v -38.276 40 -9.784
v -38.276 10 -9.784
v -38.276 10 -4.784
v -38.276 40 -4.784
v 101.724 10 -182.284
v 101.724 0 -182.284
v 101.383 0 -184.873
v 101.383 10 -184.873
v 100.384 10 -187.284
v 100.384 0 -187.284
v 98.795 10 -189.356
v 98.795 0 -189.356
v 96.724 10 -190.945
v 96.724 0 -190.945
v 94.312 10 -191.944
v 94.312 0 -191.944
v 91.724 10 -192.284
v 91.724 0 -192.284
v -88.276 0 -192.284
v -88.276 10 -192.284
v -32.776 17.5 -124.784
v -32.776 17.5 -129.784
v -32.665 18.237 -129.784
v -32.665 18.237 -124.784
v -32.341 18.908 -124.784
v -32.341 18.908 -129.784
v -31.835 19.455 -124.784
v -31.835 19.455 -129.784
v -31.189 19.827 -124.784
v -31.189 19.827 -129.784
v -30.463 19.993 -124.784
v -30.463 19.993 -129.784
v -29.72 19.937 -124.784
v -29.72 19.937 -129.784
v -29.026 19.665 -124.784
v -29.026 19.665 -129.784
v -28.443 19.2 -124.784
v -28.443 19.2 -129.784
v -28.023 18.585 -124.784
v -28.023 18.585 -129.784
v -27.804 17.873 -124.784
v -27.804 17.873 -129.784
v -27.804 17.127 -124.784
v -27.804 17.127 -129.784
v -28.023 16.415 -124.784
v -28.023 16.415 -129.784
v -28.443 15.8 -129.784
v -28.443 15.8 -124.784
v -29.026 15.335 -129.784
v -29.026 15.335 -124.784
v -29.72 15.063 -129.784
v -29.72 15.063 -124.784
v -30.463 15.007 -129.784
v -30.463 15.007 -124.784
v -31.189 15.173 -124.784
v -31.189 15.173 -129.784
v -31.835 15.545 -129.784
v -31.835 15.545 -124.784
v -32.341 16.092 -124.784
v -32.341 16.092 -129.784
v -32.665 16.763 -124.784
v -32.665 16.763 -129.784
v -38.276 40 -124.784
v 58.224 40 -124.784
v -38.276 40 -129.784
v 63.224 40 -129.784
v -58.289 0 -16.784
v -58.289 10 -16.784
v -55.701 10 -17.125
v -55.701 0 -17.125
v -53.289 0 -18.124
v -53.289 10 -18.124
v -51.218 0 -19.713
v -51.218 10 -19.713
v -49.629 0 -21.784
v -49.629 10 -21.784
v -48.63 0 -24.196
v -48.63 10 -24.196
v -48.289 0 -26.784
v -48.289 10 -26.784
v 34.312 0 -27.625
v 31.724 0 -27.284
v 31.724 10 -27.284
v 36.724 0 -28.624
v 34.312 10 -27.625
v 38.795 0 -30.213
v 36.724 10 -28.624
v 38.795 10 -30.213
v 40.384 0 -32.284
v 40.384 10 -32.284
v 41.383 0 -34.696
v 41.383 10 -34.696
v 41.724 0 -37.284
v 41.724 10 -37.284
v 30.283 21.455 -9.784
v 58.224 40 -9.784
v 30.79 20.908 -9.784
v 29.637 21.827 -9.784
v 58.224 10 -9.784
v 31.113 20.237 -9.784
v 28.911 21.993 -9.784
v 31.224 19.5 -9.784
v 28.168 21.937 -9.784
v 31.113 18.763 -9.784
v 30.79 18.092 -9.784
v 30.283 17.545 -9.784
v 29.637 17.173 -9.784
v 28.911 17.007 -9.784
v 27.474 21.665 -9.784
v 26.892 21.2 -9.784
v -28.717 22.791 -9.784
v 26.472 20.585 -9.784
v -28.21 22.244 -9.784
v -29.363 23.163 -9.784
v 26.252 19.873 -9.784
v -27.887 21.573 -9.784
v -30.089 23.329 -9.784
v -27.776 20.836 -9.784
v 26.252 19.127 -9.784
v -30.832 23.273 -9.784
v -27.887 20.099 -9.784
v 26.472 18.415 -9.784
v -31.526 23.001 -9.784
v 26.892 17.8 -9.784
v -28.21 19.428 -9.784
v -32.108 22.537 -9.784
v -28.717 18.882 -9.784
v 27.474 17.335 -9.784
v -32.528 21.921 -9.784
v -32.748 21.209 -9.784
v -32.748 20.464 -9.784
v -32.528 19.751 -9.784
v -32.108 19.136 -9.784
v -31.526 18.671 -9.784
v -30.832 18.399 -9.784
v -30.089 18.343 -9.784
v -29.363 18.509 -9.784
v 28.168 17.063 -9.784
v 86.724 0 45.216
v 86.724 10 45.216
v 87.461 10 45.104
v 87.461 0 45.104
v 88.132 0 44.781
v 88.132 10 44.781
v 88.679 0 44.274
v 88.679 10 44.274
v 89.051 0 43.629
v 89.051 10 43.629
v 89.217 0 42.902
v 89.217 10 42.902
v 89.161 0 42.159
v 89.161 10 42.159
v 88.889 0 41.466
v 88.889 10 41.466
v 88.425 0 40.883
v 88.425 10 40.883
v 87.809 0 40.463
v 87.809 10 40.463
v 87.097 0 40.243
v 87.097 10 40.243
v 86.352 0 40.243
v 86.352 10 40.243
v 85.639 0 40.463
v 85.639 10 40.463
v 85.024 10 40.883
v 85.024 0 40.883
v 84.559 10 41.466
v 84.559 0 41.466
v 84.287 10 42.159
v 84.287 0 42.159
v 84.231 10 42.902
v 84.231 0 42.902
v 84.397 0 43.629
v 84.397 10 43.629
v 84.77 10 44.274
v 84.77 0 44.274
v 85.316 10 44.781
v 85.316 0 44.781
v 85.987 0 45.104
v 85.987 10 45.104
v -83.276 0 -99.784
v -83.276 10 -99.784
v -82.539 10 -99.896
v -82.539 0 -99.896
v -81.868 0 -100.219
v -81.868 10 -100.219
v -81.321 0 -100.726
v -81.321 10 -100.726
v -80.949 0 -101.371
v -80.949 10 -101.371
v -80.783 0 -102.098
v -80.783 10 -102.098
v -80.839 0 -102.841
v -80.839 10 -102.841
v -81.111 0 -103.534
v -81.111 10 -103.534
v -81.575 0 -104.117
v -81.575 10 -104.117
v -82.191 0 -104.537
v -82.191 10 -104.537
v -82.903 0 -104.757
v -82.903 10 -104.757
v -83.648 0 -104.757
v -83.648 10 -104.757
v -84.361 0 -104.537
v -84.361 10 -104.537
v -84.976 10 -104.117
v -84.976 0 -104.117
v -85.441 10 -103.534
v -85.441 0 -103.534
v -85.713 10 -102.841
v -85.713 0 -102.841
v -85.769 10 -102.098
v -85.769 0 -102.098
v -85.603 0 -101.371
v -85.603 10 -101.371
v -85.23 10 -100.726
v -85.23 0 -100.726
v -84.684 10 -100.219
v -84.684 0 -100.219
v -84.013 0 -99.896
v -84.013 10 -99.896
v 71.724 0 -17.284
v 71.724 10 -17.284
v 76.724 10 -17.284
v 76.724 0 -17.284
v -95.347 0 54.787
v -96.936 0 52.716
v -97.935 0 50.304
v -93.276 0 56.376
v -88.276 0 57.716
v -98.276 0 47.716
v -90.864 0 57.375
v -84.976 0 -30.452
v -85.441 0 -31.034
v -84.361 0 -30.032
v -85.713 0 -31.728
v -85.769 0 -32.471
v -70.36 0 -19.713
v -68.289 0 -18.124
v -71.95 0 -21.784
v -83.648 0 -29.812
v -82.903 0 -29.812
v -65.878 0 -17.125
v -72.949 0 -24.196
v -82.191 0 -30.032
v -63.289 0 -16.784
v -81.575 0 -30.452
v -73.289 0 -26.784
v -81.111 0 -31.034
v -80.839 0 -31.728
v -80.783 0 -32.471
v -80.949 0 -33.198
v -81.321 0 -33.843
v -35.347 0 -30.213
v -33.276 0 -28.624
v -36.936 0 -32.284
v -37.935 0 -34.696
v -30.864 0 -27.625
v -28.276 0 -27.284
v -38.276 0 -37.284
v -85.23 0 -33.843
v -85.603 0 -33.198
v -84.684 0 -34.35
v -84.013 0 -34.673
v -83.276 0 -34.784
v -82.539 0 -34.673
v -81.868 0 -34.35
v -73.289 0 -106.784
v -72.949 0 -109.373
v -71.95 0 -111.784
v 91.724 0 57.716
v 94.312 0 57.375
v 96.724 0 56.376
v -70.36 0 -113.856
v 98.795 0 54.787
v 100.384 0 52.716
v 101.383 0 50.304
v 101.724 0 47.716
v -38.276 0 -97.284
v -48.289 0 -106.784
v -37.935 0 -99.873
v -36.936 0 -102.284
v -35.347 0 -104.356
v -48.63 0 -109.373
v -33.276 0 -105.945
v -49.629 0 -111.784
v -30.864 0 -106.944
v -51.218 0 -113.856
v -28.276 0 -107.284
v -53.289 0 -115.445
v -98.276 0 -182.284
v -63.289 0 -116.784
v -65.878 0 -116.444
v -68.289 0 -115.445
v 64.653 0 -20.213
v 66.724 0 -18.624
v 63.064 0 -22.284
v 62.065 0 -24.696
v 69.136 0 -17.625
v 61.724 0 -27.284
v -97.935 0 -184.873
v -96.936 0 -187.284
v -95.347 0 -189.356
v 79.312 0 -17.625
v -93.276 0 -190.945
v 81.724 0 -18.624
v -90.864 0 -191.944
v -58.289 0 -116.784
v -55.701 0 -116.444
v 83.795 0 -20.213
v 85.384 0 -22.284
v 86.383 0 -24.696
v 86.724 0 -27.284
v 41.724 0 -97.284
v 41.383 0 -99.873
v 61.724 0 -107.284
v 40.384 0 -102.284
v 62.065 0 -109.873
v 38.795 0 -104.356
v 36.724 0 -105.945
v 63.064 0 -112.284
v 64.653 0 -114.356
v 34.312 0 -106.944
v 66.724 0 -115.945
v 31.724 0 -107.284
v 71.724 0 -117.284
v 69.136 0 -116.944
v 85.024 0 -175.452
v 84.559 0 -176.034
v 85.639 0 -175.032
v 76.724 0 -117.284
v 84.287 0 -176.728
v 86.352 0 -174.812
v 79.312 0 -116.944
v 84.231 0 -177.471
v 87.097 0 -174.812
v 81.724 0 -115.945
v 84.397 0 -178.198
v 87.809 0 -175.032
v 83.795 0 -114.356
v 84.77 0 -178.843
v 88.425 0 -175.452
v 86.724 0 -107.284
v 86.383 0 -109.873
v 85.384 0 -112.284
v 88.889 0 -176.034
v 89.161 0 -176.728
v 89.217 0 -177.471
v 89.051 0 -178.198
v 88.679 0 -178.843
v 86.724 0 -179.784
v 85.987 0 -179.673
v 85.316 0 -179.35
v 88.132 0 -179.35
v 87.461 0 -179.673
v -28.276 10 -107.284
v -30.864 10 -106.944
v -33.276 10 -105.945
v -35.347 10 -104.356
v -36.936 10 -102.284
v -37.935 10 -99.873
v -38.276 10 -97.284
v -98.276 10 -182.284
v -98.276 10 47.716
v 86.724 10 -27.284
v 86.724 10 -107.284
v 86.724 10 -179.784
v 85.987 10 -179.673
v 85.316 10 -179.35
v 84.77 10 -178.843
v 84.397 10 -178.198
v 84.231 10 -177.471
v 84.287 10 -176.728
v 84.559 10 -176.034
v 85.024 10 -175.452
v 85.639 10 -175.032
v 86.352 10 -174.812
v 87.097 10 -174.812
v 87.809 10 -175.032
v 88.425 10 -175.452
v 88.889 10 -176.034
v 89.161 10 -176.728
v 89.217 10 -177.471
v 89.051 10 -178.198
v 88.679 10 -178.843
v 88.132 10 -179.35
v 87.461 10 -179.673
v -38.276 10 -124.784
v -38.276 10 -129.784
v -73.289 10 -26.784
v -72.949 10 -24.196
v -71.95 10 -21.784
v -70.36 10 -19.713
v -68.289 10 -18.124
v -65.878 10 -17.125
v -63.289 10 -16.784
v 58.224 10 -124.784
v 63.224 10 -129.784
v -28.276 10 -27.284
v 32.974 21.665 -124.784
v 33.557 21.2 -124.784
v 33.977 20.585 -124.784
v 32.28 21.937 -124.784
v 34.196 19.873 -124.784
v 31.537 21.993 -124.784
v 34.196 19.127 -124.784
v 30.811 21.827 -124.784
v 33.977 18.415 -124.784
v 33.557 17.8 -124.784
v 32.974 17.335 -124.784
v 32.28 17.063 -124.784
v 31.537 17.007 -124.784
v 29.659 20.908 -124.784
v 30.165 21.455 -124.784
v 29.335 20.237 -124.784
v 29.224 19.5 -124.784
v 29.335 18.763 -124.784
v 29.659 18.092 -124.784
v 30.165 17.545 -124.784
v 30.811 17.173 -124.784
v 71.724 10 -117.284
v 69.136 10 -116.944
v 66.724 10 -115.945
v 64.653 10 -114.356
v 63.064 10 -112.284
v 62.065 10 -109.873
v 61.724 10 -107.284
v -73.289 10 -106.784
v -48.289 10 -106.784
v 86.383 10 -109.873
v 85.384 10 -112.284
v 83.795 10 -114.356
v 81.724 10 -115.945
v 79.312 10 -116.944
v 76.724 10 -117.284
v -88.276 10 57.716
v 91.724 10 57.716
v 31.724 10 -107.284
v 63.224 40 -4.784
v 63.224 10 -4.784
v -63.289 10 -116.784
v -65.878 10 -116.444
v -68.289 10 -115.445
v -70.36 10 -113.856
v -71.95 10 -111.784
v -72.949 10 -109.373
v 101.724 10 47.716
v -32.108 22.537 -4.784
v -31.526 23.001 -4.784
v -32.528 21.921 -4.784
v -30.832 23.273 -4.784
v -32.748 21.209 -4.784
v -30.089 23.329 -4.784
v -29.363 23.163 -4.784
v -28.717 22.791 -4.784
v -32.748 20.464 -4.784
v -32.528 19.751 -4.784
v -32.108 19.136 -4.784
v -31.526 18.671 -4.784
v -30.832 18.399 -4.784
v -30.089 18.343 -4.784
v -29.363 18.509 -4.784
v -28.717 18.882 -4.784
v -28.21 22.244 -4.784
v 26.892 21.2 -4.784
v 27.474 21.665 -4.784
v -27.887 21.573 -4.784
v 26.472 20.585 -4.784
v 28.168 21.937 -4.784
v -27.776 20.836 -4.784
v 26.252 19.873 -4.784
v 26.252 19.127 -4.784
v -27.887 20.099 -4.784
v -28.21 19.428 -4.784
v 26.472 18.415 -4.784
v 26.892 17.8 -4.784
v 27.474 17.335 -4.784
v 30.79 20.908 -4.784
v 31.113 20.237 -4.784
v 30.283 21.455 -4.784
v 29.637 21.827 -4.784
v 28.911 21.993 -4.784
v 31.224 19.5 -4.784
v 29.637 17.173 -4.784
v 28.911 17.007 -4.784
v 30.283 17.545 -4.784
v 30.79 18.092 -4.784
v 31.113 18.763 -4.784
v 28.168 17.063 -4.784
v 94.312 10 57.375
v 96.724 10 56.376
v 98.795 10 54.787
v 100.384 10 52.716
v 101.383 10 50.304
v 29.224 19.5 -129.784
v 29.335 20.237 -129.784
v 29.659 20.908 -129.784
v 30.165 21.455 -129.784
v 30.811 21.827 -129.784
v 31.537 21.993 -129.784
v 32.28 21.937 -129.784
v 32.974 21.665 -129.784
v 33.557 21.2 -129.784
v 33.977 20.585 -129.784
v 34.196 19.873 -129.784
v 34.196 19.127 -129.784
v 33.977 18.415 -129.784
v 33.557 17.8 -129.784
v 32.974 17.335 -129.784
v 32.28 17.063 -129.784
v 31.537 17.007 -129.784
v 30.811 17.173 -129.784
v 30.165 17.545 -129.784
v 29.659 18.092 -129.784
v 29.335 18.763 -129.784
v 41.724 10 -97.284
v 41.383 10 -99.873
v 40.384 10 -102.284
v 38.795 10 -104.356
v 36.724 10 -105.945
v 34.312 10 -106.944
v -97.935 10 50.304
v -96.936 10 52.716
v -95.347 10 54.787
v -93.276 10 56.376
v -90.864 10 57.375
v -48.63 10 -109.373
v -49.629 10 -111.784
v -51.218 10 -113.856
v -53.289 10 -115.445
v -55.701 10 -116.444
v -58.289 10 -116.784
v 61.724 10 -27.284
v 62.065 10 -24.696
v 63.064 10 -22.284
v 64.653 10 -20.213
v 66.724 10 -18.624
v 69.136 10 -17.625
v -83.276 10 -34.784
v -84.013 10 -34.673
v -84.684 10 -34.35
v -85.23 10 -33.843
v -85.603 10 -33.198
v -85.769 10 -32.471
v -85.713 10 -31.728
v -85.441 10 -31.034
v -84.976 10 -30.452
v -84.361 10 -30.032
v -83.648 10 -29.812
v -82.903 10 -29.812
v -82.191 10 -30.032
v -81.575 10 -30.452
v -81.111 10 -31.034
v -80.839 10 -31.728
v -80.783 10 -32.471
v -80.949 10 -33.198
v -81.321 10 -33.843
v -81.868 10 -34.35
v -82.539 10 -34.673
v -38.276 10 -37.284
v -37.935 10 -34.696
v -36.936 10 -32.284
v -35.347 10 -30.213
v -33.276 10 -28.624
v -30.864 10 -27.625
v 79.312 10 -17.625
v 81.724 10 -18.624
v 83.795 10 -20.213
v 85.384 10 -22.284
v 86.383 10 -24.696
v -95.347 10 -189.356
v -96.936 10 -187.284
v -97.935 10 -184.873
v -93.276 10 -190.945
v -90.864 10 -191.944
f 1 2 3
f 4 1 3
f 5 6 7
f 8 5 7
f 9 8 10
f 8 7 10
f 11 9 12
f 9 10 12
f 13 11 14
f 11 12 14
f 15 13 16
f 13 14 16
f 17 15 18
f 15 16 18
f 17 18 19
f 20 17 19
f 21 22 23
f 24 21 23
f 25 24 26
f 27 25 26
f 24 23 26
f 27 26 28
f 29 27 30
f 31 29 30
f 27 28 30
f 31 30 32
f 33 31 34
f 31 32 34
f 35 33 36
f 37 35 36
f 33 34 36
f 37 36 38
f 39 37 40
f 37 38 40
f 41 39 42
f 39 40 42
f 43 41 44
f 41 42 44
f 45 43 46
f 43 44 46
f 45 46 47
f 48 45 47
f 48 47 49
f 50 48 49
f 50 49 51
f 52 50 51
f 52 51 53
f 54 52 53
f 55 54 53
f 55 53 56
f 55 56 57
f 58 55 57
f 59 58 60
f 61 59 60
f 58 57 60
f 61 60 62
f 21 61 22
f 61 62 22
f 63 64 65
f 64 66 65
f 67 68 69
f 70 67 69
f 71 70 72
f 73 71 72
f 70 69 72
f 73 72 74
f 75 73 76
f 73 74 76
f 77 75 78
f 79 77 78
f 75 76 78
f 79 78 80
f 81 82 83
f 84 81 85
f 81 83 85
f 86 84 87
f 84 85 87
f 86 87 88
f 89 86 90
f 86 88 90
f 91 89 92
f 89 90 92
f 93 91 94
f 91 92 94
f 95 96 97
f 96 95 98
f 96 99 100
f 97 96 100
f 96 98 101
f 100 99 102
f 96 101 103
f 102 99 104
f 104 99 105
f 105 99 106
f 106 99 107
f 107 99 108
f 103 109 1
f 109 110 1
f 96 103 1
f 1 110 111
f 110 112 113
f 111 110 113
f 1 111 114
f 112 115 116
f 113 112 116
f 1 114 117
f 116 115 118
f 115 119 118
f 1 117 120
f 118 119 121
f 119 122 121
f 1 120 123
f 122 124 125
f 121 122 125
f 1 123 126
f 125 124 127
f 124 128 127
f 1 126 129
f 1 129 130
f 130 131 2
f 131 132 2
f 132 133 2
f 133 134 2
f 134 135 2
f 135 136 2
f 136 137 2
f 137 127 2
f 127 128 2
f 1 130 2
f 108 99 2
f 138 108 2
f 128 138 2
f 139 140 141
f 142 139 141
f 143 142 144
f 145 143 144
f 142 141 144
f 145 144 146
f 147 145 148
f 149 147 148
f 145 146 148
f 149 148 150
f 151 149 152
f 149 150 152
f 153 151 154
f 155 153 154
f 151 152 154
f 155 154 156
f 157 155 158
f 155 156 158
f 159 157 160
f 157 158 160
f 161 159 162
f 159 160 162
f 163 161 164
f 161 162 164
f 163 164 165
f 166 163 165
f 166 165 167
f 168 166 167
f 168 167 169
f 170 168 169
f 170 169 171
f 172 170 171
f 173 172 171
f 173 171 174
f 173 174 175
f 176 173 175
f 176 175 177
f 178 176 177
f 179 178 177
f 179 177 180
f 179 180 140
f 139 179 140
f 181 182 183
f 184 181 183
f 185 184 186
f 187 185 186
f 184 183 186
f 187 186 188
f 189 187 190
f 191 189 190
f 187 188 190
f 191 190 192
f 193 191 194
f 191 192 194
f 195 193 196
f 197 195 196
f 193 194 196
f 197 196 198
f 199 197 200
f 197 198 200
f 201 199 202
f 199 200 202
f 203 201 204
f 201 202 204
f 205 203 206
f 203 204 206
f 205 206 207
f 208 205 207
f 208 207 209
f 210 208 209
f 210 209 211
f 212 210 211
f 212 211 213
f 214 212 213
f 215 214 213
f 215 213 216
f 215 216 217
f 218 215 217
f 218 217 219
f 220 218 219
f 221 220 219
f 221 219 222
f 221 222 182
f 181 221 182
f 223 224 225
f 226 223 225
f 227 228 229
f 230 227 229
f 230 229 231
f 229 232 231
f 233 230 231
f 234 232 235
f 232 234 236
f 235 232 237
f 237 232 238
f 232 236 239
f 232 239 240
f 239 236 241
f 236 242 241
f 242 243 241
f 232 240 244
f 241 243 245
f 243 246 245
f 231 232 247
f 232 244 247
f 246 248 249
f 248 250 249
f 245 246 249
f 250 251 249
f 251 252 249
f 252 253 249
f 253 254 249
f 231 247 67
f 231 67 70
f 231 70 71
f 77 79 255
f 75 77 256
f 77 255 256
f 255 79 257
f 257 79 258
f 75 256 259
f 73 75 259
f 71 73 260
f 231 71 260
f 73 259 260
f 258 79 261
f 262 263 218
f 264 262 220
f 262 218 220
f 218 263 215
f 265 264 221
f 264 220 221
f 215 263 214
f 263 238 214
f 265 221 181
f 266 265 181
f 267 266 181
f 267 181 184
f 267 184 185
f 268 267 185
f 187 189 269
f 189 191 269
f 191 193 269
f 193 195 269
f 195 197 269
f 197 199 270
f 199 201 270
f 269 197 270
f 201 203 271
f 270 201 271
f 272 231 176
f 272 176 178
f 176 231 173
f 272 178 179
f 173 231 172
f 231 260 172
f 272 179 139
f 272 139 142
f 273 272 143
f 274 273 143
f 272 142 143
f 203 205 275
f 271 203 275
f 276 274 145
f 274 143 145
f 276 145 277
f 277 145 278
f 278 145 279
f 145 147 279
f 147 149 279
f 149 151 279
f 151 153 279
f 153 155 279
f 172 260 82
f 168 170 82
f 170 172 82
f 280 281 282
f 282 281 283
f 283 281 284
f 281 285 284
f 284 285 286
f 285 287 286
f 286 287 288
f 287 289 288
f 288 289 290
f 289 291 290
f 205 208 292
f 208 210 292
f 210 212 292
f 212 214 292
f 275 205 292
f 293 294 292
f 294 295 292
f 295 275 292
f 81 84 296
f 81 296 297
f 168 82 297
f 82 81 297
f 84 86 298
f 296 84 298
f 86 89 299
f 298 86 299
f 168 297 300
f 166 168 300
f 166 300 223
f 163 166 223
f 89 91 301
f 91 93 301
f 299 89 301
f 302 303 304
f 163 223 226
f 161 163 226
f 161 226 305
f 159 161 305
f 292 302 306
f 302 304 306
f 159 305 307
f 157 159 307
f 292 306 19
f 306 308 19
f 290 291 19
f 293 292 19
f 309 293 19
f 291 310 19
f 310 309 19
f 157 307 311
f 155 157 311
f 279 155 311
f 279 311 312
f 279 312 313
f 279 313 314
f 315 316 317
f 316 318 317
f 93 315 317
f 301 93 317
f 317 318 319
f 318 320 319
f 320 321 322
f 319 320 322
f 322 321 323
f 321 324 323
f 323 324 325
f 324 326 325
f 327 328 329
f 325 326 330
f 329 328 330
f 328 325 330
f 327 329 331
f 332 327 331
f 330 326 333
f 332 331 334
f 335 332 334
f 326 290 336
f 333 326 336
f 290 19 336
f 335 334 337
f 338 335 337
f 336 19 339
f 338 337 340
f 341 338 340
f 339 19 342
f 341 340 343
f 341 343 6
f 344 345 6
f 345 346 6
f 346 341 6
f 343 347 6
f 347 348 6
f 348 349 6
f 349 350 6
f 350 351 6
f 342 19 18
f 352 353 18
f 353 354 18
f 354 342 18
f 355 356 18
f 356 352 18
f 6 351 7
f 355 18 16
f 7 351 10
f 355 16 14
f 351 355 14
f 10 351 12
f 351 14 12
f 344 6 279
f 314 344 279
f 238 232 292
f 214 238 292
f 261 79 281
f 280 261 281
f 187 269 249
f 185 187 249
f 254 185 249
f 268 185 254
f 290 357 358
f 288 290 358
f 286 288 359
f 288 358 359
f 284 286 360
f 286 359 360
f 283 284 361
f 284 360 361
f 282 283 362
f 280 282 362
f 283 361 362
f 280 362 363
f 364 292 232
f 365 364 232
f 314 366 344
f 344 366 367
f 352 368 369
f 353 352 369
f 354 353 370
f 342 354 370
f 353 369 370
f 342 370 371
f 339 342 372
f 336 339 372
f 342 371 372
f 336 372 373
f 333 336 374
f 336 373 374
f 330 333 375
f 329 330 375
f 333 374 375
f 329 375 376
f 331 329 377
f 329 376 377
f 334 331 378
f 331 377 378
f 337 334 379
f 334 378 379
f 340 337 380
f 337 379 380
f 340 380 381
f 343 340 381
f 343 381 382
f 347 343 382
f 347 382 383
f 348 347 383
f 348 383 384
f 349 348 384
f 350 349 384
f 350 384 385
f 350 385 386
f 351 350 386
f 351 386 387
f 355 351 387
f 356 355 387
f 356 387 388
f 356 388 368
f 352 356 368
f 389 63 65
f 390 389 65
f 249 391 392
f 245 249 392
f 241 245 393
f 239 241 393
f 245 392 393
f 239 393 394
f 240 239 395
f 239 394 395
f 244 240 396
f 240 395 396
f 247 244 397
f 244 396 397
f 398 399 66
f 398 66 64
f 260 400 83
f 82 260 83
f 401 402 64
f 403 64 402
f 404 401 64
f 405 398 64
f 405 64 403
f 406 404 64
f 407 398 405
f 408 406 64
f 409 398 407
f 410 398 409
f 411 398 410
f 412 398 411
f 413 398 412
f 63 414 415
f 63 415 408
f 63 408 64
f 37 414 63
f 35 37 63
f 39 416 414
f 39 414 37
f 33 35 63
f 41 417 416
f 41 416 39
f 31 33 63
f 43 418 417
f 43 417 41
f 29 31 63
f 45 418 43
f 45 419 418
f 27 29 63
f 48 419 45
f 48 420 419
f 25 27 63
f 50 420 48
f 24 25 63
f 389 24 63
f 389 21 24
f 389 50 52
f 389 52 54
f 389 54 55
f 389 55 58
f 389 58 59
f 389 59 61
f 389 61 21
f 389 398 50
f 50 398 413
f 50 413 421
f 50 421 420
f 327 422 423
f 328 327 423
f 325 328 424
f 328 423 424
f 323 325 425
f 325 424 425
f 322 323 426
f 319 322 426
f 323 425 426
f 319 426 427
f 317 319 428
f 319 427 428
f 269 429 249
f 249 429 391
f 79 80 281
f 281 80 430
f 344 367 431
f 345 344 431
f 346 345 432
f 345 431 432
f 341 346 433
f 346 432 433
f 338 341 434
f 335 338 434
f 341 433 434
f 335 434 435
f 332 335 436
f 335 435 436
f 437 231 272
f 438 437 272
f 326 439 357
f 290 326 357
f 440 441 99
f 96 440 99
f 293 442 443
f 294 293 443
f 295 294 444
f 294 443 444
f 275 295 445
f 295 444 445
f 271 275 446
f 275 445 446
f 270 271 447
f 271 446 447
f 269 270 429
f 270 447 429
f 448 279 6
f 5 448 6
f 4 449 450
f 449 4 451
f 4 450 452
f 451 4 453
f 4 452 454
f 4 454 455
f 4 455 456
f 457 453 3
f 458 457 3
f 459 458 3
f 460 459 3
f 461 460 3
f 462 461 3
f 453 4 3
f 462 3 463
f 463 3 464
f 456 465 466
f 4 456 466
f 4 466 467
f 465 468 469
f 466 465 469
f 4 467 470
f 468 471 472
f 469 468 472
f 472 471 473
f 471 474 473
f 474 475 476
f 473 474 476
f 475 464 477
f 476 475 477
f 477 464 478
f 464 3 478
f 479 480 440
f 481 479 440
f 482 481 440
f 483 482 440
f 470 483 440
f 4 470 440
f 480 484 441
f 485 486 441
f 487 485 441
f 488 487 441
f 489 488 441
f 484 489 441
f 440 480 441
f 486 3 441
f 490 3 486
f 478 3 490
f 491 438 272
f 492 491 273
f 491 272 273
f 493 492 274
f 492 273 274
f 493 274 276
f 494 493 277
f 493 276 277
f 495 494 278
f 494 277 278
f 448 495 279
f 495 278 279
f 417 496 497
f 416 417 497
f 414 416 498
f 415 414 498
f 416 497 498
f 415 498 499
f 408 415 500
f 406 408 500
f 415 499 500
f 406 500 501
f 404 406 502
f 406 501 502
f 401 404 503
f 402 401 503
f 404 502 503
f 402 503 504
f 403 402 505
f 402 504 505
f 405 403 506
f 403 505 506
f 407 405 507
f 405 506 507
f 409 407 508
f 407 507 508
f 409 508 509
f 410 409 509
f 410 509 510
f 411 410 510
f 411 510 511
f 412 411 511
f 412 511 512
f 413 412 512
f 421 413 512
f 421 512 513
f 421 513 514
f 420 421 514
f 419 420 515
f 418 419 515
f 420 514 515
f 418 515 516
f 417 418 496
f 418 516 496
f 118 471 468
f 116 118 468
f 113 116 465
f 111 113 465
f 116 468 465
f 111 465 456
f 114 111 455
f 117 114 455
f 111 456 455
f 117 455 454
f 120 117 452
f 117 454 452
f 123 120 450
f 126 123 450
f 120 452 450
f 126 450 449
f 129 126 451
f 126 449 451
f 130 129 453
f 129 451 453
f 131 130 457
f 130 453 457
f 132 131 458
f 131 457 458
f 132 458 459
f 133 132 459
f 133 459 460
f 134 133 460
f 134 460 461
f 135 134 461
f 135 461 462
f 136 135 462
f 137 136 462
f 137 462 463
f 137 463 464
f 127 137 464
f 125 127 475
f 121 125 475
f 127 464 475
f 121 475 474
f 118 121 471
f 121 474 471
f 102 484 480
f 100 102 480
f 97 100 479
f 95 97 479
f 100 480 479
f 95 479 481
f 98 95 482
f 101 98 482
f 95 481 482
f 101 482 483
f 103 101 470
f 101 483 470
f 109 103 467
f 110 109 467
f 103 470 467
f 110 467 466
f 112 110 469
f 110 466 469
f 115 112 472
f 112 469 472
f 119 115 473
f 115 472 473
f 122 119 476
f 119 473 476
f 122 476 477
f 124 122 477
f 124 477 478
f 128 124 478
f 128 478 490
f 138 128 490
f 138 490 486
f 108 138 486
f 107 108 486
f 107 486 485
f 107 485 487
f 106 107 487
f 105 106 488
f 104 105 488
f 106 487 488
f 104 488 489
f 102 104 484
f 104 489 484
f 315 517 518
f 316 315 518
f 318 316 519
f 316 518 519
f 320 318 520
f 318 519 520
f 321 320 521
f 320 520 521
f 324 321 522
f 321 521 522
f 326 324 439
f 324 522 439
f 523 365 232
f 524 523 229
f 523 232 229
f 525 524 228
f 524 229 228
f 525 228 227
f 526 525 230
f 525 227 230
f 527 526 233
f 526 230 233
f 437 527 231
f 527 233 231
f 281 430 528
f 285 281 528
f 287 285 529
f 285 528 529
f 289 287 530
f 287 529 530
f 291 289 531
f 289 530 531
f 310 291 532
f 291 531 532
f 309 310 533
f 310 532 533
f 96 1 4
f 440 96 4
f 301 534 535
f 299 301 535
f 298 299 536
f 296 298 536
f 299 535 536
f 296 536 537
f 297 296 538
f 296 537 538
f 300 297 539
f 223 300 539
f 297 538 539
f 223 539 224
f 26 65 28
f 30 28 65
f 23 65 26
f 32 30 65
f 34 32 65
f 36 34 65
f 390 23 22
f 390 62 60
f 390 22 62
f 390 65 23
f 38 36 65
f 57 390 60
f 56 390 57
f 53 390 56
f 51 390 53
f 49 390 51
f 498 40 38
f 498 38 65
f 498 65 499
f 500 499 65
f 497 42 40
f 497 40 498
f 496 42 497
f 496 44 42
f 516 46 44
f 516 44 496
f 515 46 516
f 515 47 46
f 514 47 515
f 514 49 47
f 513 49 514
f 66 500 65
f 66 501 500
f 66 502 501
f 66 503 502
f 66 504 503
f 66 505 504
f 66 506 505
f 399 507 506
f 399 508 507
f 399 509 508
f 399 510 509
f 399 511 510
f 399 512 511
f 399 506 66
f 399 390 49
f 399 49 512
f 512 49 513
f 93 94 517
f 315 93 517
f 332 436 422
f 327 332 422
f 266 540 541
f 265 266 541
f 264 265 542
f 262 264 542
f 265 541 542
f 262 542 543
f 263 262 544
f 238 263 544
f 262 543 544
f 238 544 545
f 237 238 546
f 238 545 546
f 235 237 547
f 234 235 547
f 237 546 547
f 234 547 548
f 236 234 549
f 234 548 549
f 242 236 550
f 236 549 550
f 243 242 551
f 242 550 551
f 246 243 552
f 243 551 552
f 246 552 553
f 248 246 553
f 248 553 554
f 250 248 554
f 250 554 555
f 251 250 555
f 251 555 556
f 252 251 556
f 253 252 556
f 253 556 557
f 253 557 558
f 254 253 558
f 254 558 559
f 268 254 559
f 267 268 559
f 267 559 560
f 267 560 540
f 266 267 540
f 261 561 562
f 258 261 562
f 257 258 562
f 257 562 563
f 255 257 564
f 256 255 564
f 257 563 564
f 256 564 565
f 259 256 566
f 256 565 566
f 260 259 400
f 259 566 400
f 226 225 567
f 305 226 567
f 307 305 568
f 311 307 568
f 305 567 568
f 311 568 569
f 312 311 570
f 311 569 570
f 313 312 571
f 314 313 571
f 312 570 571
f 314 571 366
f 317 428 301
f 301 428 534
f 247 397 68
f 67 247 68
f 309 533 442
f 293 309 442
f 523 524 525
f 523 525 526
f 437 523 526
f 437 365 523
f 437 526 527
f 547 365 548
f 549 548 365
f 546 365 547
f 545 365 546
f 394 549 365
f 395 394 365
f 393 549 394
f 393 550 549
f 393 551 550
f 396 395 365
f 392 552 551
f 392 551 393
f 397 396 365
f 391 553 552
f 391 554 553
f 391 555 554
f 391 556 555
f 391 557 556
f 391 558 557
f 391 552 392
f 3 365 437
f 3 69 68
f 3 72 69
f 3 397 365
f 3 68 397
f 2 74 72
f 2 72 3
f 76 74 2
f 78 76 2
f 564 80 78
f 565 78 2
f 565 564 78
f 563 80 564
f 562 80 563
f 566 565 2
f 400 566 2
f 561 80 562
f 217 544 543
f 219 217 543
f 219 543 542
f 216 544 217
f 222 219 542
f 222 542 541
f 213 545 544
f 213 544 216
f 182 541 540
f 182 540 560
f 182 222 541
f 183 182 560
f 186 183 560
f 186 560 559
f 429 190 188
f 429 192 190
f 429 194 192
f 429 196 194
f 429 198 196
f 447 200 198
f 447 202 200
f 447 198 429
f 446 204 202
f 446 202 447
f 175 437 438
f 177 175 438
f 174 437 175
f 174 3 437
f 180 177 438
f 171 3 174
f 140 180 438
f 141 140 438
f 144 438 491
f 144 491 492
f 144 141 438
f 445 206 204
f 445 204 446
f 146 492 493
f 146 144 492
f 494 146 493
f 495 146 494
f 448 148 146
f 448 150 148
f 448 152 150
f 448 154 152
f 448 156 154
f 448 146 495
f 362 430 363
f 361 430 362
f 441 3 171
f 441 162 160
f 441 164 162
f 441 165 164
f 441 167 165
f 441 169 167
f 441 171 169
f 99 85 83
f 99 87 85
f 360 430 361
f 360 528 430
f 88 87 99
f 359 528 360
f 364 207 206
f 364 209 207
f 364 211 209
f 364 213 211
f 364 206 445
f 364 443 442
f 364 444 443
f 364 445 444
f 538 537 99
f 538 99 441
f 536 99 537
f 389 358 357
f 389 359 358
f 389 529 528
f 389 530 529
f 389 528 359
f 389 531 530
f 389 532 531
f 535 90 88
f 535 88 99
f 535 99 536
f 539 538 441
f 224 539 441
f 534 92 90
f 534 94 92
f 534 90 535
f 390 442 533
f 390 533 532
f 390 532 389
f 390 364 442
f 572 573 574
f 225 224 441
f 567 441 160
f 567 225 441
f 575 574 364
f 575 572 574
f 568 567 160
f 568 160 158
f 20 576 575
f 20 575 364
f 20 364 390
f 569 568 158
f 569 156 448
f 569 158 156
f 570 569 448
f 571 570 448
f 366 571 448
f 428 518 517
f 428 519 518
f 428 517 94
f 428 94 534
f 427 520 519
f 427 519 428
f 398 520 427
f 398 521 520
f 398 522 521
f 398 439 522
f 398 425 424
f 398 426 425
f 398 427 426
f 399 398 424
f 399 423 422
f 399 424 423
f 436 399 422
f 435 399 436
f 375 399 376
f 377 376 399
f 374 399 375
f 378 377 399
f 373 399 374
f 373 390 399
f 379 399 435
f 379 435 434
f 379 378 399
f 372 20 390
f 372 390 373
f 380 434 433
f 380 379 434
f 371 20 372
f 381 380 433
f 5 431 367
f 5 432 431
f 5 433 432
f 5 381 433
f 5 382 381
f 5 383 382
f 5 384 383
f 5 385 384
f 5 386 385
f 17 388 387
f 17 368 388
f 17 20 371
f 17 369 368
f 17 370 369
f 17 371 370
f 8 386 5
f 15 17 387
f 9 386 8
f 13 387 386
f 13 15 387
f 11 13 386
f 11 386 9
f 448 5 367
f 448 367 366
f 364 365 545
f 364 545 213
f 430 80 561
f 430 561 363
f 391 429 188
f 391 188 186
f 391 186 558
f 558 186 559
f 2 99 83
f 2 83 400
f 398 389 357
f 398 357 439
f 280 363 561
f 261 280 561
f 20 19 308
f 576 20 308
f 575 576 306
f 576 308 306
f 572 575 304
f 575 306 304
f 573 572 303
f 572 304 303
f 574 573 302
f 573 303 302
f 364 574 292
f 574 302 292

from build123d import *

# Parameters (mm, degrees)
RESSALTO_EXTRUS_O1_DEPTH = 10
ESBO_O2_R                = 2.5
CORTE_EXTRUS_O1_DEPTH    = 218.763914705
RESSALTO_EXTRUS_O2_DEPTH = 30
ESBO_O5_R                = 2.5
CORTE_EXTRUS_O2_DEPTH    = 5
ESBO_O6_R                = 2.5
CORTE_EXTRUS_O3_DEPTH    = 5
CORTE_EXTRUS_O4_DEPTH    = 10


with BuildPart() as part:
    # Esboço1 → Ressalto-extrusão1 (new body)
    with BuildSketch(Plane(origin=(0, 0, 0), x_dir=(1, 0, 0), z_dir=(0, 1, 0))):
        with BuildLine():
            Line((-88.275862069, -57.715517241), (91.724137931, -57.715517241))
            ThreePointArc((91.724137931, -57.715517241), (98.795205743, -54.786585053), (101.724137931, -47.715517241))
            Line((101.724137931, -47.715517241), (101.724137931, 182.284482759))
            ThreePointArc((101.724137931, 182.284482759), (98.795205743, 189.35555057), (91.724137931, 192.284482759))
            Line((91.724137931, 192.284482759), (-88.275862069, 192.284482759))
            ThreePointArc((-88.275862069, 192.284482759), (-95.346929881, 189.35555057), (-98.275862069, 182.284482759))
            Line((-98.275862069, 182.284482759), (-98.275862069, -47.715517241))
            ThreePointArc((-98.275862069, -47.715517241), (-95.346929881, -54.786585053), (-88.275862069, -57.715517241))
        make_face()
    extrude(amount=RESSALTO_EXTRUS_O1_DEPTH)

    # Esboço2 → Corte-extrusão1 (cut, through all)
    with BuildSketch(Plane(origin=(0, 10, 0), x_dir=(1, 0, 0), z_dir=(0, 1, 0))):
        with Locations(Location((-83.275862069, 102.284482759, 0), (0, 0, 270))):
            Circle(ESBO_O2_R)
        with Locations(Location((86.724137931, 177.284482759, 0), (0, 0, 90))):
            Circle(ESBO_O2_R)
        with Locations(Location((86.724137931, -42.715517241, 0), (0, 0, 270))):
            Circle(ESBO_O2_R)
        with Locations(Location((-83.275862069, 32.284482759, 0), (0, 0, 90))):
            Circle(ESBO_O2_R)
        with BuildLine():
            Line((31.724137931, 107.284482759), (-28.275862069, 107.284482759))
            ThreePointArc((-28.275862069, 107.284482759), (-35.346929881, 104.35555057), (-38.275862069, 97.284482759))
            Line((-38.275862069, 97.284482759), (-38.275862069, 37.284482759))
            ThreePointArc((-38.275862069, 37.284482759), (-35.346929881, 30.213414947), (-28.275862069, 27.284482759))
            Line((-28.275862069, 27.284482759), (31.724137931, 27.284482759))
            ThreePointArc((31.724137931, 27.284482759), (38.795205743, 30.213414947), (41.724137931, 37.284482759))
            Line((41.724137931, 37.284482759), (41.724137931, 97.284482759))
            ThreePointArc((41.724137931, 97.284482759), (38.795205743, 104.35555057), (31.724137931, 107.284482759))
        make_face()
    extrude(amount=-CORTE_EXTRUS_O1_DEPTH, mode=Mode.SUBTRACT)

    # Esboço4 → Ressalto-extrusão2 (add)
    with BuildSketch(Plane(origin=(0, 10, 0), x_dir=(1, 0, 0), z_dir=(0, 1, 0))):
        Polygon((58.224137931, 9.784482759), (-38.275862069, 9.784482759), (-38.275862069, 4.784482759), (63.224137931, 4.784482759), align=None)
        Polygon((58.224137931, 124.784482759), (-38.275862069, 124.784482759), (-38.275862069, 129.784482759), (63.224137931, 129.784482759), align=None)
    extrude(amount=RESSALTO_EXTRUS_O2_DEPTH)

    # Esboço5 → Corte-extrusão2 (cut)
    with BuildSketch(Plane.XY.offset(-4.784482759)):
        with Locations((-30.275862069, 20.836178243)):
            Circle(ESBO_O5_R)
        with Locations((28.724137931, 19.5)):
            Circle(ESBO_O5_R)
    extrude(amount=-CORTE_EXTRUS_O2_DEPTH, mode=Mode.SUBTRACT)

    # Esboço6 → Corte-extrusão3 (cut)
    with BuildSketch(Plane(origin=(0, 0, -129.784482759), x_dir=(-1, 0, 0), z_dir=(0, 0, -1))):
        with Locations((-31.724137931, 19.5)):
            Circle(ESBO_O6_R)
        with Locations((30.275862069, 17.5)):
            Circle(ESBO_O6_R)
    extrude(amount=-CORTE_EXTRUS_O3_DEPTH, mode=Mode.SUBTRACT)

    # Esboço7 → Corte-extrusão4 (cut)
    with BuildSketch(Plane(origin=(0, 10, 0), x_dir=(1, 0, 0), z_dir=(0, 1, 0))):
        with BuildLine():
            Line((76.724137931, 117.284482759), (71.724137931, 117.284482759))
            ThreePointArc((71.724137931, 117.284482759), (64.653070119, 114.35555057), (61.724137931, 107.284482759))
            Line((61.724137931, 107.284482759), (61.724137931, 27.284482759))
            ThreePointArc((61.724137931, 27.284482759), (64.653070119, 20.213414947), (71.724137931, 17.284482759))
            Line((71.724137931, 17.284482759), (76.724137931, 17.284482759))
            ThreePointArc((76.724137931, 17.284482759), (83.795205743, 20.213414947), (86.724137931, 27.284482759))
            Line((86.724137931, 27.284482759), (86.724137931, 107.284482759))
            ThreePointArc((86.724137931, 107.284482759), (83.795205743, 114.35555057), (76.724137931, 117.284482759))
        make_face()
        with BuildLine():
            Line((-58.289420658, 116.784482759), (-63.289420658, 116.784482759))
            ThreePointArc((-63.289420658, 116.784482759), (-70.36048847, 113.85555057), (-73.289420658, 106.784482759))
            Line((-73.289420658, 106.784482759), (-73.289420658, 26.784482759))
            ThreePointArc((-73.289420658, 26.784482759), (-70.36048847, 19.713414947), (-63.289420658, 16.784482759))
            Line((-63.289420658, 16.784482759), (-58.289420658, 16.784482759))
            ThreePointArc((-58.289420658, 16.784482759), (-51.218352846, 19.713414947), (-48.289420658, 26.784482759))
            Line((-48.289420658, 26.784482759), (-48.289420658, 106.784482759))
            ThreePointArc((-48.289420658, 106.784482759), (-51.218352846, 113.85555057), (-58.289420658, 116.784482759))
        make_face()
    extrude(amount=-CORTE_EXTRUS_O4_DEPTH, mode=Mode.SUBTRACT)


solid = part.part
